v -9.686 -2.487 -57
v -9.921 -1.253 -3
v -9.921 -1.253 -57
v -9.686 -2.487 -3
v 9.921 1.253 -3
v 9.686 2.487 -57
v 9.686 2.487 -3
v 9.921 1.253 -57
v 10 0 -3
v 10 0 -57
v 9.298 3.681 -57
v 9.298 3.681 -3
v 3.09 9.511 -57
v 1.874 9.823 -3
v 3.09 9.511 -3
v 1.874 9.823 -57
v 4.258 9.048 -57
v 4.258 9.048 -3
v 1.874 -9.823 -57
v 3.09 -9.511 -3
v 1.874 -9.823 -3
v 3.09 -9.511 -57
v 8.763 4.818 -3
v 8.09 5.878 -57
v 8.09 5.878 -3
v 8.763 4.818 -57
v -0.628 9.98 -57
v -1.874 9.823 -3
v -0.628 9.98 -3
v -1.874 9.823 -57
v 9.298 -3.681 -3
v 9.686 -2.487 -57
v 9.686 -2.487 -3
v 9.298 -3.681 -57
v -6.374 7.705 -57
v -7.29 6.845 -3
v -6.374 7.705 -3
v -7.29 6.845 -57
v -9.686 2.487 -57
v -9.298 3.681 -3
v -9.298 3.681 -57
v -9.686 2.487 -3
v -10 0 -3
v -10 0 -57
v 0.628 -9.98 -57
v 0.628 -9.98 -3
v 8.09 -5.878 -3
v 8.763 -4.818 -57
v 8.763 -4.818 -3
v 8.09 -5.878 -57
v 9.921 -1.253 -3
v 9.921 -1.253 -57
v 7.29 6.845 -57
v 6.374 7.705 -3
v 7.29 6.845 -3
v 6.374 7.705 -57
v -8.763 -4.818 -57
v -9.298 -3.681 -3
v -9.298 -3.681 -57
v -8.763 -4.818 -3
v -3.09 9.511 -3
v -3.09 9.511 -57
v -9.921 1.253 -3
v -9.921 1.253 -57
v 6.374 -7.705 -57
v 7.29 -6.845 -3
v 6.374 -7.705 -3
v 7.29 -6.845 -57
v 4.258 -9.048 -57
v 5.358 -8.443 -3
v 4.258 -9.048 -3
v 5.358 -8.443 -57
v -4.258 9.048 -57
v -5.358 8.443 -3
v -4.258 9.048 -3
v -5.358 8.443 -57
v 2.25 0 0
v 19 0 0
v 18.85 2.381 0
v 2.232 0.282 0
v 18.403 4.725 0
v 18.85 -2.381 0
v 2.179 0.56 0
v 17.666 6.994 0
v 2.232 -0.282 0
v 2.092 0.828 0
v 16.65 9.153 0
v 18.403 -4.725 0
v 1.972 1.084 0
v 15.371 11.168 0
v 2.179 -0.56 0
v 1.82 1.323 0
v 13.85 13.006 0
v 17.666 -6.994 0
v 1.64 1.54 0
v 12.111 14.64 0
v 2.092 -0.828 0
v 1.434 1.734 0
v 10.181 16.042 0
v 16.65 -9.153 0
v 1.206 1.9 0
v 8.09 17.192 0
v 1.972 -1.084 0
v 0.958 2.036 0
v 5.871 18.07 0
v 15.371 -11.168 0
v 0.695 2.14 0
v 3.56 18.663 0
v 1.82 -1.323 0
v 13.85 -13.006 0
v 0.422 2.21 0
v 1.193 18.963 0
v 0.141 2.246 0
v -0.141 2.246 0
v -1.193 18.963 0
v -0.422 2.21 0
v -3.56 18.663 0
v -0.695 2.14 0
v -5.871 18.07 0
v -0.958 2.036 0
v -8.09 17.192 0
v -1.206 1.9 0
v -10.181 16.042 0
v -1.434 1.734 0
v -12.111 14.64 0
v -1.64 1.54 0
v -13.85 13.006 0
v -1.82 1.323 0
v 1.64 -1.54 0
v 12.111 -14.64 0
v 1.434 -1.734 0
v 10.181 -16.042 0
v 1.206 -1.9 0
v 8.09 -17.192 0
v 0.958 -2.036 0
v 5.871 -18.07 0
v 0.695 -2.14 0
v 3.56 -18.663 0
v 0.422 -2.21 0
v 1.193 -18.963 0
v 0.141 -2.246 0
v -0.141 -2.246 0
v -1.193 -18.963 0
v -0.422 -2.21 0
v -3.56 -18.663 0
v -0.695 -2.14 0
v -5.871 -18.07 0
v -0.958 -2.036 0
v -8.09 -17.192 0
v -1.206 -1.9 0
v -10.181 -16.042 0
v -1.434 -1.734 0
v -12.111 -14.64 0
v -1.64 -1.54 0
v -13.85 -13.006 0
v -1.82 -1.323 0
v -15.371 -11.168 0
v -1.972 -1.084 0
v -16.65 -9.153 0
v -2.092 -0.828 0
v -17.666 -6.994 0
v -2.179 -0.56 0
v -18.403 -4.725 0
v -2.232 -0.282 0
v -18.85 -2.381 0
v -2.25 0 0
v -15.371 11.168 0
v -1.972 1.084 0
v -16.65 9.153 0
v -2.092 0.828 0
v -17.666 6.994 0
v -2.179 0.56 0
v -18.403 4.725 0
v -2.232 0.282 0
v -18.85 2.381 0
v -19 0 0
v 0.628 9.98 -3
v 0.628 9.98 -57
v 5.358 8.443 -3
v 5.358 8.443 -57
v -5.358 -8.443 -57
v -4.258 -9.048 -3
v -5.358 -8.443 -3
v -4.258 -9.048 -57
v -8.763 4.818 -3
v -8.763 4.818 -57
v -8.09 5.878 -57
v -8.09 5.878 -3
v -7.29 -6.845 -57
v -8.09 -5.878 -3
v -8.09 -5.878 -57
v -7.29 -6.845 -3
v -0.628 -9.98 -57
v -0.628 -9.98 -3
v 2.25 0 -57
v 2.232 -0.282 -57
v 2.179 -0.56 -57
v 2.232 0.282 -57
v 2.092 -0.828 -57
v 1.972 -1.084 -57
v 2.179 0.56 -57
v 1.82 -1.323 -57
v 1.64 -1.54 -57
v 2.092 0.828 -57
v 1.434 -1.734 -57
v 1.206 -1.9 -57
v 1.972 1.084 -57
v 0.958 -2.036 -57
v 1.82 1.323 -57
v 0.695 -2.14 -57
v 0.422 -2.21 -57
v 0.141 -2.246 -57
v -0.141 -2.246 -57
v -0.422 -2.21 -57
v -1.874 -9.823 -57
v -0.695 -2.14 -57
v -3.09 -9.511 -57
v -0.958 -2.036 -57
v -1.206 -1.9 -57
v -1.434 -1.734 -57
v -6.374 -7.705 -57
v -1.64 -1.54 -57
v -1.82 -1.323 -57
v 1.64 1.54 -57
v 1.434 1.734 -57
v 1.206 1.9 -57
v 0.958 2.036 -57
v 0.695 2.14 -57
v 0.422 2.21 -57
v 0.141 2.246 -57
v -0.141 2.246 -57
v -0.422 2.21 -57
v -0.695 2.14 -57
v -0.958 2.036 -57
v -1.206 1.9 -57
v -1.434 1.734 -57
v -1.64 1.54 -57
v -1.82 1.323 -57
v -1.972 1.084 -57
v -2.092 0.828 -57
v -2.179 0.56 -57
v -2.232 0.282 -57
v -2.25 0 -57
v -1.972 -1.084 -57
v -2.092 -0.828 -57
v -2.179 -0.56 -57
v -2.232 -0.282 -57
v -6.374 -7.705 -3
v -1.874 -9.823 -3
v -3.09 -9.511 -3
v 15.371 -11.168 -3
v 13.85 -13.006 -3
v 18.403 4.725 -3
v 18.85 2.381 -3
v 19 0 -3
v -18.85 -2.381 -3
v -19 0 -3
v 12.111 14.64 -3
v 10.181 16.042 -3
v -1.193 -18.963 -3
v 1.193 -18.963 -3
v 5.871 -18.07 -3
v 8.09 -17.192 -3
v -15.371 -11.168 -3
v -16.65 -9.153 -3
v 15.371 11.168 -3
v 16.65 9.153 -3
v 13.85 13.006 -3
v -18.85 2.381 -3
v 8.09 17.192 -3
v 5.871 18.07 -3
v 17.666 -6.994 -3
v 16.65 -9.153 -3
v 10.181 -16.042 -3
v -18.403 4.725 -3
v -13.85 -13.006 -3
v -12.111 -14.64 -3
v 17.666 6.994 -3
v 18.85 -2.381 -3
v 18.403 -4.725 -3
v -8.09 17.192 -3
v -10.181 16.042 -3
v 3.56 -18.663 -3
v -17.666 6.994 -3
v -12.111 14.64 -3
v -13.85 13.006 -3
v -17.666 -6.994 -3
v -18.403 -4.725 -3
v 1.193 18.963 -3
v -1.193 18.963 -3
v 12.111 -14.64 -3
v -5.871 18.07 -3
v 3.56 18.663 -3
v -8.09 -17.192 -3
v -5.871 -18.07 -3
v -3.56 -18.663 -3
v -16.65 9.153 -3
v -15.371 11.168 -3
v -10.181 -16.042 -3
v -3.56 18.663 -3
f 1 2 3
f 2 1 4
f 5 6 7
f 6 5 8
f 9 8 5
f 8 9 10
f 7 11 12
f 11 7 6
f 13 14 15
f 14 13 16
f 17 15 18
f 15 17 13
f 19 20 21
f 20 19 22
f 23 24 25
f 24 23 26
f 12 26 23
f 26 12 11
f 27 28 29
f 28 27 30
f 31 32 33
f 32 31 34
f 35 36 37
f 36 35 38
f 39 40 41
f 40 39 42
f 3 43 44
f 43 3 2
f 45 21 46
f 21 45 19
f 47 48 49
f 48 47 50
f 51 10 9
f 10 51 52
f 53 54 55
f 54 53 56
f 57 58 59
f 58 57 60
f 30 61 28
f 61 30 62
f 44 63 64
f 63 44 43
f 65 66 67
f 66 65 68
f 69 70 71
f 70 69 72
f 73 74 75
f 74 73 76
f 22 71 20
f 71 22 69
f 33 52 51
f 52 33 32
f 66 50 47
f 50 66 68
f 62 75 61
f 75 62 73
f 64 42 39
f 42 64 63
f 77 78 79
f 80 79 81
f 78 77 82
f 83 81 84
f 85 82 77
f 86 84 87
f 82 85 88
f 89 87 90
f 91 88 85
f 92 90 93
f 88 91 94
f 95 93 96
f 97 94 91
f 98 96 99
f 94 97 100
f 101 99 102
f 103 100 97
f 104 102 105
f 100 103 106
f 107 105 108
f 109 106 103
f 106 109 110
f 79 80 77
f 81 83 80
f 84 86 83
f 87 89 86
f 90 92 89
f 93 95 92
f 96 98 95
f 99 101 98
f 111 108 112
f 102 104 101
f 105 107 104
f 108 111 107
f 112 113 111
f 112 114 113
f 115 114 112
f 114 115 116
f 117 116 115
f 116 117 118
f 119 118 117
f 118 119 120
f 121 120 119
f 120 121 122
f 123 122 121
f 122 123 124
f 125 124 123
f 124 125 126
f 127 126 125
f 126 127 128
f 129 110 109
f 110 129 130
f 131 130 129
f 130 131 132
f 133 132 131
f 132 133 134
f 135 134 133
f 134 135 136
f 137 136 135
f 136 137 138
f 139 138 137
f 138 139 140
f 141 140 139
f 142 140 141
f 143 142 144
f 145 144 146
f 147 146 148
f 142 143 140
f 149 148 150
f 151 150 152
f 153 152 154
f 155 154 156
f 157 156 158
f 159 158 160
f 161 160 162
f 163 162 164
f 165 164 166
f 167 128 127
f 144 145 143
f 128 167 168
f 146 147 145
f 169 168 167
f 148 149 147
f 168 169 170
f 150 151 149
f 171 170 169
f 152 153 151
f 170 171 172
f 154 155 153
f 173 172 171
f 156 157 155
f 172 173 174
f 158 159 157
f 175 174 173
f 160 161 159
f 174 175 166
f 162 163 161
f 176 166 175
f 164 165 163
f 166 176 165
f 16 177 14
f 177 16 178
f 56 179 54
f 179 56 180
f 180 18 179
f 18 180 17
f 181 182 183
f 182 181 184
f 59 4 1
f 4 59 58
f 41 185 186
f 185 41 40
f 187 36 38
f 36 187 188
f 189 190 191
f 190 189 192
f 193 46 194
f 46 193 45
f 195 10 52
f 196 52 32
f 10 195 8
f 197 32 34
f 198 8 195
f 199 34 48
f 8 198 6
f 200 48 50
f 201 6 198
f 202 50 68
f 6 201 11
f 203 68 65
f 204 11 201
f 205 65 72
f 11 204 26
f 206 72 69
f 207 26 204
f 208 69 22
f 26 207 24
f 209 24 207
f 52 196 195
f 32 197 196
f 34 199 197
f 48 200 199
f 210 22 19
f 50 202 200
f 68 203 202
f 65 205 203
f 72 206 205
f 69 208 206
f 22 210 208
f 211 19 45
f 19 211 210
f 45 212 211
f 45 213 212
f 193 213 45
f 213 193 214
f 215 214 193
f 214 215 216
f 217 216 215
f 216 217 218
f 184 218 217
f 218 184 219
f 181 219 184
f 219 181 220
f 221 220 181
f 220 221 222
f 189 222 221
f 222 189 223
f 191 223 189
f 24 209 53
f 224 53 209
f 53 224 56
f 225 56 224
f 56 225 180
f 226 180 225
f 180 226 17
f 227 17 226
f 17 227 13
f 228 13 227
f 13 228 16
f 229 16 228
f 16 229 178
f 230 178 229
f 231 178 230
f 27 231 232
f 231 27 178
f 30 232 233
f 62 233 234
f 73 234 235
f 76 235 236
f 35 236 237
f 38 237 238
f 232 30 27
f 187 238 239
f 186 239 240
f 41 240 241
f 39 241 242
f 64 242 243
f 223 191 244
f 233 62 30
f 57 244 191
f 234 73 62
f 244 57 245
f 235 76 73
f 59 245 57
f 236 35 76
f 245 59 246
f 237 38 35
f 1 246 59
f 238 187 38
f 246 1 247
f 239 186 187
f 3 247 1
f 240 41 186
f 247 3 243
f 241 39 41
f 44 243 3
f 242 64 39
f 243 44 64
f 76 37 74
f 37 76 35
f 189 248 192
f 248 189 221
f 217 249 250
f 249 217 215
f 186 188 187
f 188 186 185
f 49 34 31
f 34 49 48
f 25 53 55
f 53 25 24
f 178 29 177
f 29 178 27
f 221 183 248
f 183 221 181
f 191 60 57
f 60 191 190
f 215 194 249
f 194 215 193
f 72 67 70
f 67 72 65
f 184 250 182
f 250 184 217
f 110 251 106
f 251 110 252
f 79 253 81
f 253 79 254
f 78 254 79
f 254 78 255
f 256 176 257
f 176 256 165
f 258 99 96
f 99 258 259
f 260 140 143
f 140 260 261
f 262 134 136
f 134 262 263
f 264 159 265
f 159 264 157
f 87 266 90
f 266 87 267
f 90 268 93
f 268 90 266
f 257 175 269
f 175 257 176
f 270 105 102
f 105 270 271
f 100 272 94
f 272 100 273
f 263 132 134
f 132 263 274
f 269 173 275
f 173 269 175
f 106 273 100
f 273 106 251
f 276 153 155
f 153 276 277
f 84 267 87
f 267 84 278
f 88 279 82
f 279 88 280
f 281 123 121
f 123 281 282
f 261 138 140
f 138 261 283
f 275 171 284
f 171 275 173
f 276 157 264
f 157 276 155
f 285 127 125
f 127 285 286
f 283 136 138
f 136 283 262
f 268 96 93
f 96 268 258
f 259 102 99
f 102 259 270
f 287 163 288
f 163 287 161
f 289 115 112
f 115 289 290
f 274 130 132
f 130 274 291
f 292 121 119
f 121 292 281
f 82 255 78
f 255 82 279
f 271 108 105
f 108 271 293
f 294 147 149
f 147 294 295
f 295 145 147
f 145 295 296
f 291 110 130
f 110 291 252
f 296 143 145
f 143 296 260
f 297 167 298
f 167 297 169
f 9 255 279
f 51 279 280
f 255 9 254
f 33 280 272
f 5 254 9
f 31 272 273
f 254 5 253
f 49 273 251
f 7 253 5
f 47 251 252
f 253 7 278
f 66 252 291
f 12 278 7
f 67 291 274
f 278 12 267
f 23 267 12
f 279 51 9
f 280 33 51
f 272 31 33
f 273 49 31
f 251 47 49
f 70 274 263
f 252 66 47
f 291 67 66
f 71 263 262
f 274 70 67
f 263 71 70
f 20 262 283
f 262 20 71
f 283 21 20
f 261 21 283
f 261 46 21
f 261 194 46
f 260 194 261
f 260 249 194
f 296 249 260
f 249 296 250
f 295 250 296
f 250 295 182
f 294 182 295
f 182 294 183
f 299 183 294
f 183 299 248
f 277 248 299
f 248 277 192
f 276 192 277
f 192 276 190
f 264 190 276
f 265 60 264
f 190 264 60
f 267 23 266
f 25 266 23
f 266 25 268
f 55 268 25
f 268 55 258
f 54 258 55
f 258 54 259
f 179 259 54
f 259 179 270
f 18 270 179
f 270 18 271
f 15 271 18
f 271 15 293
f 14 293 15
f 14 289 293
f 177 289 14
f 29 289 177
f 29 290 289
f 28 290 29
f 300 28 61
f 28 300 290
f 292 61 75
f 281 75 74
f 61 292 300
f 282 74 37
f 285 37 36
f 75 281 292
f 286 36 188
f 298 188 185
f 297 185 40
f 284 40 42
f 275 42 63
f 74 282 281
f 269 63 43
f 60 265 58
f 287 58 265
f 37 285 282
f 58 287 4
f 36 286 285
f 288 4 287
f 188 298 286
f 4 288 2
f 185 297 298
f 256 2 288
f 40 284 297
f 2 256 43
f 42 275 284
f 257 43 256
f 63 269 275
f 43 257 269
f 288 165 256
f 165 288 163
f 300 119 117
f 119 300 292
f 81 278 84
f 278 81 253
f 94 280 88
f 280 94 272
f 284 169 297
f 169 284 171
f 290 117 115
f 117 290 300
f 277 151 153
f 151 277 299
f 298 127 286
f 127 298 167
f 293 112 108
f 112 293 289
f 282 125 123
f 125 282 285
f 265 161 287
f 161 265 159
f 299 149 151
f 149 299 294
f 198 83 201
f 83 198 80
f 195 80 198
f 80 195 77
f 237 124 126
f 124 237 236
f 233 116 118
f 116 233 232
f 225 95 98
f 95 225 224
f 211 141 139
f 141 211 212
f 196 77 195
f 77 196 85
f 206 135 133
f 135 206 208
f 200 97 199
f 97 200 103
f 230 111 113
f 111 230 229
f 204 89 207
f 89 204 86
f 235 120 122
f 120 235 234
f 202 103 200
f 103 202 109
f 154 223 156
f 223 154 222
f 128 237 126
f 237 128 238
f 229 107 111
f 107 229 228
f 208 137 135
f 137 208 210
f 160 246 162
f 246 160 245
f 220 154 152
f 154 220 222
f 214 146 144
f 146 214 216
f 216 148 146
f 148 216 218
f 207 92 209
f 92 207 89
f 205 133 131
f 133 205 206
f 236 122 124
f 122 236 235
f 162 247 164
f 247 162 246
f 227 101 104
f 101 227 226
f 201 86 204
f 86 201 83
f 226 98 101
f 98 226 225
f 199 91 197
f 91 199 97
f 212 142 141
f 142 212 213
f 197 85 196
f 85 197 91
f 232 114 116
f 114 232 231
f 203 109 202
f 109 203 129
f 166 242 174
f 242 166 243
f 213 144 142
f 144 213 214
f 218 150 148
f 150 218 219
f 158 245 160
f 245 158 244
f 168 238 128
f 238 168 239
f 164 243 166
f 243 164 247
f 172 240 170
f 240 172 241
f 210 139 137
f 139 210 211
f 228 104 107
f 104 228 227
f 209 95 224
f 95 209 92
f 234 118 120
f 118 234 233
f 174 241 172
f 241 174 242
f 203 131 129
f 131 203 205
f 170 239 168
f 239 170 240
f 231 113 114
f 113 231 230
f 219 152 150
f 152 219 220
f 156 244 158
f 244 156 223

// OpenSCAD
$fn = 50;


difference() {
	union() {
		translate(v = [0, 0, -57.0000000000]) {
			cylinder(h = 57, r = 10.0000000000);
		}
		translate(v = [0, 0, -3.0000000000]) {
			cylinder(h = 3, r = 19.0000000000);
		}
	}
	union() {
		#translate(v = [0, 0, -57]) {
			cylinder(h = 57, r = 2.2500000000);
		}
	}
}
